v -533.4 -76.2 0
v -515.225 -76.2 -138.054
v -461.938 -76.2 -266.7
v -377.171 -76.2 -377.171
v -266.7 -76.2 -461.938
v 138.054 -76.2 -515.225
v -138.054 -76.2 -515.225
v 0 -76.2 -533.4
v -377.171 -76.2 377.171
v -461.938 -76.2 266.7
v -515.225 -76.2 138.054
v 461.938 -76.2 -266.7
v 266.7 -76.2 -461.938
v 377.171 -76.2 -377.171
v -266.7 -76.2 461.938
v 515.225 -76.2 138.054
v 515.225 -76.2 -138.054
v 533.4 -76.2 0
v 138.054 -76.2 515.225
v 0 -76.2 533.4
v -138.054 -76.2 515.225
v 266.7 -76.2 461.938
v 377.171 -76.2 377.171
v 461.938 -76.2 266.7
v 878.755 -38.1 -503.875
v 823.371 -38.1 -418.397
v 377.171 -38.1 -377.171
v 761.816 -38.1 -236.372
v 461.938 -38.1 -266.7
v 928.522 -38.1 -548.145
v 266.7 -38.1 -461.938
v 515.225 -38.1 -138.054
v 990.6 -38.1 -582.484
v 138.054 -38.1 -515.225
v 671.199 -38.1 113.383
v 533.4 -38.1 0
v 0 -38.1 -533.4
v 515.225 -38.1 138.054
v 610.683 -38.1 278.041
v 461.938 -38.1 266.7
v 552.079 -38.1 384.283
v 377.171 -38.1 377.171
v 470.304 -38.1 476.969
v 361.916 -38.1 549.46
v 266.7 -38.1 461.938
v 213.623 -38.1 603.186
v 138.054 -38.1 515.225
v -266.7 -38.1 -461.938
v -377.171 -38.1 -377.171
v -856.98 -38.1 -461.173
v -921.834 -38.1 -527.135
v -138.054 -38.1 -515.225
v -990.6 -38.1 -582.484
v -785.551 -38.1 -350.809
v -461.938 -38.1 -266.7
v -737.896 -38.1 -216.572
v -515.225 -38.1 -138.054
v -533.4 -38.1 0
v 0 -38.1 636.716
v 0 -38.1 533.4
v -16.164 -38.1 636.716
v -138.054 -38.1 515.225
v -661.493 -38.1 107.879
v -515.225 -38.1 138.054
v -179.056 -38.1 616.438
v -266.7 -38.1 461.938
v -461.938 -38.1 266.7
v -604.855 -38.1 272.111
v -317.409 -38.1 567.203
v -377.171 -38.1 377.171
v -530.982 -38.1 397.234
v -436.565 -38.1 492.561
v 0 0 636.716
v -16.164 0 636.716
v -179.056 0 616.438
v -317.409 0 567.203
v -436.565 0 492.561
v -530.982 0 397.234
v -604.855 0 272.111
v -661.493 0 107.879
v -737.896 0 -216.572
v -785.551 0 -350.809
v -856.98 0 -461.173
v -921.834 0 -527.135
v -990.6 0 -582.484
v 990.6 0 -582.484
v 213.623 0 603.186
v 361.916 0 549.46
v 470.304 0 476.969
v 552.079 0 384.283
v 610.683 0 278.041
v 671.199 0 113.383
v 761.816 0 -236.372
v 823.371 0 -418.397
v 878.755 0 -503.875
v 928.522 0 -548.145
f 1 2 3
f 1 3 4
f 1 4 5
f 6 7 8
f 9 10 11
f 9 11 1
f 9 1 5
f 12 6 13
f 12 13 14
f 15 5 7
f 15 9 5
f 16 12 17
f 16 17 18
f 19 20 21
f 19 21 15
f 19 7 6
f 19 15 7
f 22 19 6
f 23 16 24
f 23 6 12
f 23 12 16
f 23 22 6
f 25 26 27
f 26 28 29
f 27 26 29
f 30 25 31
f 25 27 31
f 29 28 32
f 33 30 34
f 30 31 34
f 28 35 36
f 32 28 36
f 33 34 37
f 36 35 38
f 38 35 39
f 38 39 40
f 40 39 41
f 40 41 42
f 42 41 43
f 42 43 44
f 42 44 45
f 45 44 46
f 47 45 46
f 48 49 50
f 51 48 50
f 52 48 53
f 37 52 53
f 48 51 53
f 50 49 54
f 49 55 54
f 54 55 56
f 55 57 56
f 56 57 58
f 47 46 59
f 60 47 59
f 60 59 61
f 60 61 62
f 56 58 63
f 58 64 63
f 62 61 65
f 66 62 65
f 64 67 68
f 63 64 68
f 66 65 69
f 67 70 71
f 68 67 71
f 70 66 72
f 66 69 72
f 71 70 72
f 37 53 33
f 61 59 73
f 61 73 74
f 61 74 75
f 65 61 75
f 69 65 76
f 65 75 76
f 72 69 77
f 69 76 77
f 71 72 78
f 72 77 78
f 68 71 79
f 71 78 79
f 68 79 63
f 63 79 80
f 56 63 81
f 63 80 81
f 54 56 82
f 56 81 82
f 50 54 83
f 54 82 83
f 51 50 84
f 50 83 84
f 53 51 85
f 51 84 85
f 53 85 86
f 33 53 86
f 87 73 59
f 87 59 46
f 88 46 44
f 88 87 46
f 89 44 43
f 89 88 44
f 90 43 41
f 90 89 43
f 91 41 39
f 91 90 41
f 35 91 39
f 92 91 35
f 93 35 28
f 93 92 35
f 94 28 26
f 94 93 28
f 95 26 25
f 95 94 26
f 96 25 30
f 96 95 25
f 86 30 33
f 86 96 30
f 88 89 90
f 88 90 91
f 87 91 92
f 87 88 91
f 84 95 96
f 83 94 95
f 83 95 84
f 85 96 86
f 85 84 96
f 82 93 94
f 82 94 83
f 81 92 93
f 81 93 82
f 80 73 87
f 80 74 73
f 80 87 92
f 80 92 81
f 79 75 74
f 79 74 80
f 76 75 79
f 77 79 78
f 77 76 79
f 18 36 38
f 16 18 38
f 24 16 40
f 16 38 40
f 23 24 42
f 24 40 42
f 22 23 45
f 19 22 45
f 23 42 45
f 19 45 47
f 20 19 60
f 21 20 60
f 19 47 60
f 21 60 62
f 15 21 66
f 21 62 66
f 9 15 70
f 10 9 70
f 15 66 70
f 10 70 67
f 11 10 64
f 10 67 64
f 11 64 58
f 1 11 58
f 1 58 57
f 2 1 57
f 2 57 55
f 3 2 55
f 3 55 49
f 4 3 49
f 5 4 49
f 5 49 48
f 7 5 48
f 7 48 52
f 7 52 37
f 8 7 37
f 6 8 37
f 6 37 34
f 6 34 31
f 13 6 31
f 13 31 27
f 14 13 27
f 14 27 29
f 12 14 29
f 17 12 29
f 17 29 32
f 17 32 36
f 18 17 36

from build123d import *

# Parameters (mm, degrees)
F0_R     = 533.4
F1_DEPTH = 76.2
F2_DEPTH = 38.1


with BuildPart() as f1:
    # F0 (on Front) → F1 (new body)
    with BuildSketch(Plane.XZ):
        Circle(F0_R)
    extrude(amount=F1_DEPTH)

    # F0 (on Front) → F2 (join)
    with BuildSketch(Plane.XZ):
        with BuildLine():
            add(Edge.make_bspline(
                [(0, 636.7163507462), (239.2118357706, 615.8238007368), (646.7304954871, 494.7721182449), (752.2000078985, -358.8744339162), (888.6927709826, -538.11212785), (990.6, -582.4836492538)],
                knots=[0, 0, 0, 0, 0.3511045998, 0.7477812832, 1, 1, 1, 1], degree=3))
            Line((0, 636.7163507462), (-16.1643760611, 636.7163507462))
            add(Edge.make_bspline(
                [(-16.1643760611, 636.7163507462), (-229.7135389785, 634.3414307642), (-676.1585202117, 432.5072199226), (-703.987628904, -342.8286029025), (-907.6178488485, -520.3338171156), (-990.6, -582.4836492538)],
                knots=[0.008772266, 0.008772266, 0.008772266, 0.008772266, 0.3564248173, 0.7365874264, 1, 1, 1, 1], degree=3))
            Line((-990.6, -582.4836492538), (990.6, -582.4836492538))
        make_face()
        Circle(F0_R, mode=Mode.SUBTRACT)
    extrude(amount=F2_DEPTH)


solid = f1.part
